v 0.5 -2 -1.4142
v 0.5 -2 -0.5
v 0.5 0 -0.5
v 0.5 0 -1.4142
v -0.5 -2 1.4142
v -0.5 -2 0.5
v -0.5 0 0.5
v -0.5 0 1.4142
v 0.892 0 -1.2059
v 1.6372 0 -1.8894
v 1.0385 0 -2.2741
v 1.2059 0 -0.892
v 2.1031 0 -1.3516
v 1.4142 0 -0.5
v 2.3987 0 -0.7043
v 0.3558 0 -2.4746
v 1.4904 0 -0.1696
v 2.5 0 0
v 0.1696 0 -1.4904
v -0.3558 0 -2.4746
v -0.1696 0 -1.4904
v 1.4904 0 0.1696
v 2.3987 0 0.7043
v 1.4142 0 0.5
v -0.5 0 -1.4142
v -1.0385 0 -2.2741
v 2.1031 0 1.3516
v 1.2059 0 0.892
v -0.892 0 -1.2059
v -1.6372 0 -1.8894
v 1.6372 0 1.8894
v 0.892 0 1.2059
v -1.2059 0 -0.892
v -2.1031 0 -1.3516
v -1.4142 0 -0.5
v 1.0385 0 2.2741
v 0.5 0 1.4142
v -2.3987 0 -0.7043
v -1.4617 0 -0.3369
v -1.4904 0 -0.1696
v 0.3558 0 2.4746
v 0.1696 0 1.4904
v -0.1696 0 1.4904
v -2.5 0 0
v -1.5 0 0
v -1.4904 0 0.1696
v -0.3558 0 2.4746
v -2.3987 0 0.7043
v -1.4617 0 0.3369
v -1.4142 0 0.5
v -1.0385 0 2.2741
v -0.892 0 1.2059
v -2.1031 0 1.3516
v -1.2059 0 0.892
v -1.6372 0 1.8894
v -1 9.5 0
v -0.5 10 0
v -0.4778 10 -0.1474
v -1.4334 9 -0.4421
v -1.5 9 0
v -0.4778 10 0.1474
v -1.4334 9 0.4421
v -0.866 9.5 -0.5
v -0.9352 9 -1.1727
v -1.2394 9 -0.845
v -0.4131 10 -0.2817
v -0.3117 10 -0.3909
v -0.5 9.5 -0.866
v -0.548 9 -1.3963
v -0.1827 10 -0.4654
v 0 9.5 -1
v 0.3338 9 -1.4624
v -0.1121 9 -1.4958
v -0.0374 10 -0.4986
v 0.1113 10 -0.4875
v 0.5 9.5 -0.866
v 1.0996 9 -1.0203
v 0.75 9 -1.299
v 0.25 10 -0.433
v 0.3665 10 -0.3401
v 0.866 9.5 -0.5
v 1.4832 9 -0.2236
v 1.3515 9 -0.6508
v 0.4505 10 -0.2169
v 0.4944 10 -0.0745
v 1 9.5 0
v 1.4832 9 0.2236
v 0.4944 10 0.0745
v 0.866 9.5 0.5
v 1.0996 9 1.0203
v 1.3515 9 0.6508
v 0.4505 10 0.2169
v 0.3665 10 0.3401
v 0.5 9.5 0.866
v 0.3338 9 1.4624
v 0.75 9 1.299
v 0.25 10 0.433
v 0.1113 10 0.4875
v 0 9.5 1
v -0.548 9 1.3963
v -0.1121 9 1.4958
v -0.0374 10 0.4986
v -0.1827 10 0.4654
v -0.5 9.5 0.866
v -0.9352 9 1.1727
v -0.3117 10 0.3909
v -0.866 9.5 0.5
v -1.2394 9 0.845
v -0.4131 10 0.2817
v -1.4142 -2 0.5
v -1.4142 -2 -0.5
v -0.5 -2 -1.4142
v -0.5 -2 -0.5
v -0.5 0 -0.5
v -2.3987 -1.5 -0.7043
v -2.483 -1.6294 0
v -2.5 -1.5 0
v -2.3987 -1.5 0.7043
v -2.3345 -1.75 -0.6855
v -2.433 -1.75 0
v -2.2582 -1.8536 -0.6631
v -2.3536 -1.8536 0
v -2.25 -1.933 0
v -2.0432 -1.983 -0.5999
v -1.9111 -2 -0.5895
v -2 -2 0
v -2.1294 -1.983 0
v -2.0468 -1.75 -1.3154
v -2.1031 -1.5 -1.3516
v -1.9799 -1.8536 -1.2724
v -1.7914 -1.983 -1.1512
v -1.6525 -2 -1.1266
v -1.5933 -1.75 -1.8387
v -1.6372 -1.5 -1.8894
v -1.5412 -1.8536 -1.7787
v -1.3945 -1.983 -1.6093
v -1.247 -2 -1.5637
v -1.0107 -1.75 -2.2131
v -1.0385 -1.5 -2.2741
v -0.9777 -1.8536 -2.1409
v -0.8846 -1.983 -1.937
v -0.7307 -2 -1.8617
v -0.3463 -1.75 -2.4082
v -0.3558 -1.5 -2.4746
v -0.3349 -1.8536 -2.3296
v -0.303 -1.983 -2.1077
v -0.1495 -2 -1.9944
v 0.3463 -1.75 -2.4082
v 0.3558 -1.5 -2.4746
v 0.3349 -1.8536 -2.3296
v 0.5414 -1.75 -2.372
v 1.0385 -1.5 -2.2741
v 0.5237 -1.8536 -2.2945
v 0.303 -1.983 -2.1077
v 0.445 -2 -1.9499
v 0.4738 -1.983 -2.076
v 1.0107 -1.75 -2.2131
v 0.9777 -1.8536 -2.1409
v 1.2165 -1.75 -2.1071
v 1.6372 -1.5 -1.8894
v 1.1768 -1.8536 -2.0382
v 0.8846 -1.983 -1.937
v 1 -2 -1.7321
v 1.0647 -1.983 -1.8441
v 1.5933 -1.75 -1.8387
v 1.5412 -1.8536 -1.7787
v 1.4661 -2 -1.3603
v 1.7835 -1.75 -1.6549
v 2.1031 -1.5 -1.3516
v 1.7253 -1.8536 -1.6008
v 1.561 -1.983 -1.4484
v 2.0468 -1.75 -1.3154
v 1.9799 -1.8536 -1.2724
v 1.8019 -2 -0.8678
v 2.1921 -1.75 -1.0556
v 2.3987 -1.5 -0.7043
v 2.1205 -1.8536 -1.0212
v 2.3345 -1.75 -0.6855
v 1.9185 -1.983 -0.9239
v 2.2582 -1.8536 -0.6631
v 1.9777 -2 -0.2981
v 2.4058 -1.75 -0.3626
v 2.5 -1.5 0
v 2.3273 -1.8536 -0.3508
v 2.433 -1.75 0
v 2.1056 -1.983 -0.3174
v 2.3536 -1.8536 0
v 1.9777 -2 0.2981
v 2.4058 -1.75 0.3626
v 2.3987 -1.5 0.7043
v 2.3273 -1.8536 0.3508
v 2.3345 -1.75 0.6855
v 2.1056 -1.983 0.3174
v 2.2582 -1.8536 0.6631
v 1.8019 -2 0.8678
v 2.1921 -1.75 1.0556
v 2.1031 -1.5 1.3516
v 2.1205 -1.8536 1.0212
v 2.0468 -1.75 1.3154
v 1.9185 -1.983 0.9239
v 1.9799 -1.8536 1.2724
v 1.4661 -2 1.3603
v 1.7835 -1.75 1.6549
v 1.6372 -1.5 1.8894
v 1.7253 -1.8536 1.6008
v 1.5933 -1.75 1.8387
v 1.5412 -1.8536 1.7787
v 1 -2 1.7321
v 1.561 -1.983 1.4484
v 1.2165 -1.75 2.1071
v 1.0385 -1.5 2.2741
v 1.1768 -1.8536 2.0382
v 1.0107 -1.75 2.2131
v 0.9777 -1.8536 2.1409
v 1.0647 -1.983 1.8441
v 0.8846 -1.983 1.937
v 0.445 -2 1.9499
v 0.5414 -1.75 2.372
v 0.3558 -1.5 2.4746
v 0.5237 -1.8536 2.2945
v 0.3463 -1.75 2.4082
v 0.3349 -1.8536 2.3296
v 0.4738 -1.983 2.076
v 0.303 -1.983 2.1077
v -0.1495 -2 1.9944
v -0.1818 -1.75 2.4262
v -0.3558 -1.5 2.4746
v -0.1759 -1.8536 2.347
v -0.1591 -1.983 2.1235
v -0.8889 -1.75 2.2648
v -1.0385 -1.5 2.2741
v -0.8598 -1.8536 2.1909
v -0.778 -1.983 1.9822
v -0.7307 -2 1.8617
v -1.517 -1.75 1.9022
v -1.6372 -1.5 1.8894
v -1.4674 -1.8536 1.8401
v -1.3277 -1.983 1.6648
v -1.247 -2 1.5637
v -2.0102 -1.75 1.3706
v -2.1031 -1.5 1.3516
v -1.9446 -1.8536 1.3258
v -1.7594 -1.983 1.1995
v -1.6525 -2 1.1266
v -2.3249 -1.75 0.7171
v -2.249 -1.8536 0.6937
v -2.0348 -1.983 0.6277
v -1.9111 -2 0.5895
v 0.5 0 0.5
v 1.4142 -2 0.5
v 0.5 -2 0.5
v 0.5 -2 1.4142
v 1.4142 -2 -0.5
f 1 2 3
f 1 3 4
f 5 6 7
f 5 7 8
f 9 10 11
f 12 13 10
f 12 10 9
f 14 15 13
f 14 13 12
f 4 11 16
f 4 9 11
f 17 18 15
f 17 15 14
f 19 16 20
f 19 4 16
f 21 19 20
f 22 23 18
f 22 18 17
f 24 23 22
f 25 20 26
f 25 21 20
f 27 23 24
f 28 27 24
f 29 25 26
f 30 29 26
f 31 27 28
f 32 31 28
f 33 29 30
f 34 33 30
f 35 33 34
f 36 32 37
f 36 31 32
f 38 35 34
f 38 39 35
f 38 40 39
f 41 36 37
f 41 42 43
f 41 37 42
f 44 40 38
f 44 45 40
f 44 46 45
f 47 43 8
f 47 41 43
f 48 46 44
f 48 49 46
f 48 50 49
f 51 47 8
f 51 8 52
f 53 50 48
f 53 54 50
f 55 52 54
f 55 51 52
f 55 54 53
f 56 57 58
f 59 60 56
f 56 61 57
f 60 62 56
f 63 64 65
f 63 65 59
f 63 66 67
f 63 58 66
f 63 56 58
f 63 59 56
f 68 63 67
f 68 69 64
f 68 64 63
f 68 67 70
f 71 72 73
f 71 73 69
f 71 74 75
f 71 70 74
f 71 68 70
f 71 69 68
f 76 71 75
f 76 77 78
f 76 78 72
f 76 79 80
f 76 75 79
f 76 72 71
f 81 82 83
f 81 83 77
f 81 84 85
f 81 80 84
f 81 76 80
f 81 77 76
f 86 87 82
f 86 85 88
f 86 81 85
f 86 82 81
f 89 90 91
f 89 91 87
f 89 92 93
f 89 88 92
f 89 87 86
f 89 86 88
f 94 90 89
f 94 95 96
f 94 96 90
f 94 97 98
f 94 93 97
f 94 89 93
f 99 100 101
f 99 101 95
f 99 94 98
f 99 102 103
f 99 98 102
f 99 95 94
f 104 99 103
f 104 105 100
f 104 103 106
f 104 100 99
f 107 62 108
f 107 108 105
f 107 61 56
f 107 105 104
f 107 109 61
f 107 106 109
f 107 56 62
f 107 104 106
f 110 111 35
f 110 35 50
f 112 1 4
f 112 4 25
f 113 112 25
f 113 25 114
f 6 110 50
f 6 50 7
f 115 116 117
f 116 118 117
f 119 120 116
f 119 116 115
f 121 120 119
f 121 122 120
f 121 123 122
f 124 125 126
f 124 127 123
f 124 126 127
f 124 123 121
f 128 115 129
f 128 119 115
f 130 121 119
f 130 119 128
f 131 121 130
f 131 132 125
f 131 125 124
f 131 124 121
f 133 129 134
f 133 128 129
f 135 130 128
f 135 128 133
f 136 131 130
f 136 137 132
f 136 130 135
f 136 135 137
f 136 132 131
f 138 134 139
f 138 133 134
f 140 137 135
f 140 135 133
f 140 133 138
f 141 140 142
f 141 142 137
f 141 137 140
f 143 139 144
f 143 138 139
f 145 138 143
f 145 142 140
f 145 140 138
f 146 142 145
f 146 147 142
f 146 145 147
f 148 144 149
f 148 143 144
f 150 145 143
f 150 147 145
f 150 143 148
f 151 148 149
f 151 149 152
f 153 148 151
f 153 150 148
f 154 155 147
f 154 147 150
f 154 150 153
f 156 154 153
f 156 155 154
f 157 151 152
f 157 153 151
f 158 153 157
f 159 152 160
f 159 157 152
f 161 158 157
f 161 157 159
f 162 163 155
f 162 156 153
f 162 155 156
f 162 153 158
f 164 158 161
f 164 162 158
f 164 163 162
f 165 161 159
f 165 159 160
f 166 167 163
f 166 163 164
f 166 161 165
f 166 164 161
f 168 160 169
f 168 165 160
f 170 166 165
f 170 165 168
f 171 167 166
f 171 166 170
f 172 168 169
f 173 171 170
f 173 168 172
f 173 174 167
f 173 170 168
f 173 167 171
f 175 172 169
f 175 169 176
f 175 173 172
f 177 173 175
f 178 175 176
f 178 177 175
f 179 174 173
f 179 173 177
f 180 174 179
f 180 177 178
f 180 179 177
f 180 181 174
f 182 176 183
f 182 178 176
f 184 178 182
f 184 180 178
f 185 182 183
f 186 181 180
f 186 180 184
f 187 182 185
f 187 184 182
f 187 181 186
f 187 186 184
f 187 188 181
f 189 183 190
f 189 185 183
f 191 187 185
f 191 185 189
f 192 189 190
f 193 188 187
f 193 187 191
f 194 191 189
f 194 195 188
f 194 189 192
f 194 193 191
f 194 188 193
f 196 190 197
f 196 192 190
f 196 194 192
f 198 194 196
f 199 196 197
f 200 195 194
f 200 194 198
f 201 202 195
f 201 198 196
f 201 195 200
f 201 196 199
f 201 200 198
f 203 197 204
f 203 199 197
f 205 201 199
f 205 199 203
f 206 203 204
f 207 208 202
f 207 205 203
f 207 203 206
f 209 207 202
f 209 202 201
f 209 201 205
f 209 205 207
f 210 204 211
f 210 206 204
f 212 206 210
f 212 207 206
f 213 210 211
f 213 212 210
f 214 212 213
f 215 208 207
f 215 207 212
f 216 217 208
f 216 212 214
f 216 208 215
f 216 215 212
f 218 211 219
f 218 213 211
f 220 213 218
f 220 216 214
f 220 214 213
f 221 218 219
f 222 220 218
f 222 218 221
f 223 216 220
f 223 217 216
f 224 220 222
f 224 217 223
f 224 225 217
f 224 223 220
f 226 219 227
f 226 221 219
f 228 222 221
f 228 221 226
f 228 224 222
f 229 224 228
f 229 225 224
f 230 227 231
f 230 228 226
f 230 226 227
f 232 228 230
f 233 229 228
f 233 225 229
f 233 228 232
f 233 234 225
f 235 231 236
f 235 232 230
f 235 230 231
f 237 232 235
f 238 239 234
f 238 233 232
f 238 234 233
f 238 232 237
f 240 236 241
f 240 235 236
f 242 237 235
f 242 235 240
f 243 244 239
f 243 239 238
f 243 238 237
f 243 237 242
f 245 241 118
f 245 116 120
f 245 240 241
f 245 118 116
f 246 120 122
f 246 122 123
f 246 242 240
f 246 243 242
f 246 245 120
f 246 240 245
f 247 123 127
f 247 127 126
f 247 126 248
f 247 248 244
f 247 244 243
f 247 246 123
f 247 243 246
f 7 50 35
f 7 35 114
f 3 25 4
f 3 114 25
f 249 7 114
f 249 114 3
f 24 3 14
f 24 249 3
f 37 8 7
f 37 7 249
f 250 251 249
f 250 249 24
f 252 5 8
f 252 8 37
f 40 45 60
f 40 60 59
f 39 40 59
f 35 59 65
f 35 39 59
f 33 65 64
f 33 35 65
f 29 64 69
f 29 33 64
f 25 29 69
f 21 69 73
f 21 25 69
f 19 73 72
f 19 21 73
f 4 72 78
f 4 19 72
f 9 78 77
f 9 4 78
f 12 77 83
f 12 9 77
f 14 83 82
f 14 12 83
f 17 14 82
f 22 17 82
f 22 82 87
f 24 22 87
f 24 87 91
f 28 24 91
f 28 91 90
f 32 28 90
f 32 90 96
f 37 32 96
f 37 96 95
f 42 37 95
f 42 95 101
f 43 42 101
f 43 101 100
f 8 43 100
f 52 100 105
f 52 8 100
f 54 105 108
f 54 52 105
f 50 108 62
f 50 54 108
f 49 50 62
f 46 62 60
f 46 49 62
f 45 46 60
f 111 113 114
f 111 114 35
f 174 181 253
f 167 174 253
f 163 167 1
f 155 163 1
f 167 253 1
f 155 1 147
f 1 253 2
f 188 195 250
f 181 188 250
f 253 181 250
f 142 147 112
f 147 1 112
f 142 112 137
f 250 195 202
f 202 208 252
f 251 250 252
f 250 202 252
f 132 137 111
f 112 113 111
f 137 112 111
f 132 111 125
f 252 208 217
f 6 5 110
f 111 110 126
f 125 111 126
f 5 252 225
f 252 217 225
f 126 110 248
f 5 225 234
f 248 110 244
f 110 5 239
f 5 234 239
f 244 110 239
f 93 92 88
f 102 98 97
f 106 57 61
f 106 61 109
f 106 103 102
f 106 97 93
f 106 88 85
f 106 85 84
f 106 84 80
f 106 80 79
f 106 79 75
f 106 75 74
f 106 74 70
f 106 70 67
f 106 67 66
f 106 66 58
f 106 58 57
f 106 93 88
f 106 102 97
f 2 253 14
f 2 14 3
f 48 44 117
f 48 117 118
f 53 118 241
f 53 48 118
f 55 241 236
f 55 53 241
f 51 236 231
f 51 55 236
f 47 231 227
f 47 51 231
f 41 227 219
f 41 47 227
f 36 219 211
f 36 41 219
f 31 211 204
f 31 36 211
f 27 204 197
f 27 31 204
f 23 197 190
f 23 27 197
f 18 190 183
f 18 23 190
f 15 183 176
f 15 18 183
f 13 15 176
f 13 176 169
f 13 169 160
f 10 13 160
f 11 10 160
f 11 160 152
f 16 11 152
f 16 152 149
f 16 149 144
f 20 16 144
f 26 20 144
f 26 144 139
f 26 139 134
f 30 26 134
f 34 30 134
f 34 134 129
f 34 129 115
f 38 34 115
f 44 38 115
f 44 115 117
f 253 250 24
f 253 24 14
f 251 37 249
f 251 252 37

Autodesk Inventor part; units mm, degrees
ref_plane "YZ Plane" through (0, 0, 0) normal (1, 0, 0) x (0, 1, 0)
ref_plane "XZ Plane" through (0, 0, 0) normal (0, 1, 0) x (-1, 0, 0)
ref_plane "XY Plane" through (0, 0, 0) normal (0, 0, 1) x (1, 0, 0)
sketch "Sketch1" plane through (0, 0, 0) normal (0, 1, 0) x (-1, 0, 0)
  circle A0 centre (0, 0) radius 1.5
  circle A1 centre (0, 0) radius 2.5
  dimension "d0" = 3
  dimension "d1" = 5
extrude "Extrusion1" add sketch "Sketch1" along normal blind 10 contours A0
extrude "Extrusion2" add sketch "Sketch1" against normal blind 2 contours A0 | A1
fillet "Fillet1" radius 0.5 1 edges at (2.5, -2, 0)
sketch "Sketch2" plane through (0, -2, 0) normal (0, -1, 0) x (1, 0, 0)
  circle A0 centre (0, 0) radius 1.5 projected
  line L0 (0, 0.5) -> (1.4142, 0.5)
  line L1 (1.4142, 0.5) -> (1.4142, -0.5)
  line L2 (1.4142, -0.5) -> (0, -0.5)
  line L3 (0, -0.5) -> (0, 0.5)
  dimension "d7" = 1
  dimension "d8" = 0.5
extrude "Extrusion3" cut sketch "Sketch2" against normal blind 2 contours L1 L2 L3 L0
pattern_circular "Circular Pattern1" count 4 over 360 about axis through (0, 0, 0) along (0, -1, 0) of "Extrusion3"
thread "Thread1" size "M3x0.5" class "6g" standard "ANSI Metric M Profile" full length
chamfer "Chamfer1" distance 1 angle 45 1 edges at (1.5, 10, 0)
equation "\"d8\" = 0.5 * d7"
properties part number "KisLemezcsavar"
